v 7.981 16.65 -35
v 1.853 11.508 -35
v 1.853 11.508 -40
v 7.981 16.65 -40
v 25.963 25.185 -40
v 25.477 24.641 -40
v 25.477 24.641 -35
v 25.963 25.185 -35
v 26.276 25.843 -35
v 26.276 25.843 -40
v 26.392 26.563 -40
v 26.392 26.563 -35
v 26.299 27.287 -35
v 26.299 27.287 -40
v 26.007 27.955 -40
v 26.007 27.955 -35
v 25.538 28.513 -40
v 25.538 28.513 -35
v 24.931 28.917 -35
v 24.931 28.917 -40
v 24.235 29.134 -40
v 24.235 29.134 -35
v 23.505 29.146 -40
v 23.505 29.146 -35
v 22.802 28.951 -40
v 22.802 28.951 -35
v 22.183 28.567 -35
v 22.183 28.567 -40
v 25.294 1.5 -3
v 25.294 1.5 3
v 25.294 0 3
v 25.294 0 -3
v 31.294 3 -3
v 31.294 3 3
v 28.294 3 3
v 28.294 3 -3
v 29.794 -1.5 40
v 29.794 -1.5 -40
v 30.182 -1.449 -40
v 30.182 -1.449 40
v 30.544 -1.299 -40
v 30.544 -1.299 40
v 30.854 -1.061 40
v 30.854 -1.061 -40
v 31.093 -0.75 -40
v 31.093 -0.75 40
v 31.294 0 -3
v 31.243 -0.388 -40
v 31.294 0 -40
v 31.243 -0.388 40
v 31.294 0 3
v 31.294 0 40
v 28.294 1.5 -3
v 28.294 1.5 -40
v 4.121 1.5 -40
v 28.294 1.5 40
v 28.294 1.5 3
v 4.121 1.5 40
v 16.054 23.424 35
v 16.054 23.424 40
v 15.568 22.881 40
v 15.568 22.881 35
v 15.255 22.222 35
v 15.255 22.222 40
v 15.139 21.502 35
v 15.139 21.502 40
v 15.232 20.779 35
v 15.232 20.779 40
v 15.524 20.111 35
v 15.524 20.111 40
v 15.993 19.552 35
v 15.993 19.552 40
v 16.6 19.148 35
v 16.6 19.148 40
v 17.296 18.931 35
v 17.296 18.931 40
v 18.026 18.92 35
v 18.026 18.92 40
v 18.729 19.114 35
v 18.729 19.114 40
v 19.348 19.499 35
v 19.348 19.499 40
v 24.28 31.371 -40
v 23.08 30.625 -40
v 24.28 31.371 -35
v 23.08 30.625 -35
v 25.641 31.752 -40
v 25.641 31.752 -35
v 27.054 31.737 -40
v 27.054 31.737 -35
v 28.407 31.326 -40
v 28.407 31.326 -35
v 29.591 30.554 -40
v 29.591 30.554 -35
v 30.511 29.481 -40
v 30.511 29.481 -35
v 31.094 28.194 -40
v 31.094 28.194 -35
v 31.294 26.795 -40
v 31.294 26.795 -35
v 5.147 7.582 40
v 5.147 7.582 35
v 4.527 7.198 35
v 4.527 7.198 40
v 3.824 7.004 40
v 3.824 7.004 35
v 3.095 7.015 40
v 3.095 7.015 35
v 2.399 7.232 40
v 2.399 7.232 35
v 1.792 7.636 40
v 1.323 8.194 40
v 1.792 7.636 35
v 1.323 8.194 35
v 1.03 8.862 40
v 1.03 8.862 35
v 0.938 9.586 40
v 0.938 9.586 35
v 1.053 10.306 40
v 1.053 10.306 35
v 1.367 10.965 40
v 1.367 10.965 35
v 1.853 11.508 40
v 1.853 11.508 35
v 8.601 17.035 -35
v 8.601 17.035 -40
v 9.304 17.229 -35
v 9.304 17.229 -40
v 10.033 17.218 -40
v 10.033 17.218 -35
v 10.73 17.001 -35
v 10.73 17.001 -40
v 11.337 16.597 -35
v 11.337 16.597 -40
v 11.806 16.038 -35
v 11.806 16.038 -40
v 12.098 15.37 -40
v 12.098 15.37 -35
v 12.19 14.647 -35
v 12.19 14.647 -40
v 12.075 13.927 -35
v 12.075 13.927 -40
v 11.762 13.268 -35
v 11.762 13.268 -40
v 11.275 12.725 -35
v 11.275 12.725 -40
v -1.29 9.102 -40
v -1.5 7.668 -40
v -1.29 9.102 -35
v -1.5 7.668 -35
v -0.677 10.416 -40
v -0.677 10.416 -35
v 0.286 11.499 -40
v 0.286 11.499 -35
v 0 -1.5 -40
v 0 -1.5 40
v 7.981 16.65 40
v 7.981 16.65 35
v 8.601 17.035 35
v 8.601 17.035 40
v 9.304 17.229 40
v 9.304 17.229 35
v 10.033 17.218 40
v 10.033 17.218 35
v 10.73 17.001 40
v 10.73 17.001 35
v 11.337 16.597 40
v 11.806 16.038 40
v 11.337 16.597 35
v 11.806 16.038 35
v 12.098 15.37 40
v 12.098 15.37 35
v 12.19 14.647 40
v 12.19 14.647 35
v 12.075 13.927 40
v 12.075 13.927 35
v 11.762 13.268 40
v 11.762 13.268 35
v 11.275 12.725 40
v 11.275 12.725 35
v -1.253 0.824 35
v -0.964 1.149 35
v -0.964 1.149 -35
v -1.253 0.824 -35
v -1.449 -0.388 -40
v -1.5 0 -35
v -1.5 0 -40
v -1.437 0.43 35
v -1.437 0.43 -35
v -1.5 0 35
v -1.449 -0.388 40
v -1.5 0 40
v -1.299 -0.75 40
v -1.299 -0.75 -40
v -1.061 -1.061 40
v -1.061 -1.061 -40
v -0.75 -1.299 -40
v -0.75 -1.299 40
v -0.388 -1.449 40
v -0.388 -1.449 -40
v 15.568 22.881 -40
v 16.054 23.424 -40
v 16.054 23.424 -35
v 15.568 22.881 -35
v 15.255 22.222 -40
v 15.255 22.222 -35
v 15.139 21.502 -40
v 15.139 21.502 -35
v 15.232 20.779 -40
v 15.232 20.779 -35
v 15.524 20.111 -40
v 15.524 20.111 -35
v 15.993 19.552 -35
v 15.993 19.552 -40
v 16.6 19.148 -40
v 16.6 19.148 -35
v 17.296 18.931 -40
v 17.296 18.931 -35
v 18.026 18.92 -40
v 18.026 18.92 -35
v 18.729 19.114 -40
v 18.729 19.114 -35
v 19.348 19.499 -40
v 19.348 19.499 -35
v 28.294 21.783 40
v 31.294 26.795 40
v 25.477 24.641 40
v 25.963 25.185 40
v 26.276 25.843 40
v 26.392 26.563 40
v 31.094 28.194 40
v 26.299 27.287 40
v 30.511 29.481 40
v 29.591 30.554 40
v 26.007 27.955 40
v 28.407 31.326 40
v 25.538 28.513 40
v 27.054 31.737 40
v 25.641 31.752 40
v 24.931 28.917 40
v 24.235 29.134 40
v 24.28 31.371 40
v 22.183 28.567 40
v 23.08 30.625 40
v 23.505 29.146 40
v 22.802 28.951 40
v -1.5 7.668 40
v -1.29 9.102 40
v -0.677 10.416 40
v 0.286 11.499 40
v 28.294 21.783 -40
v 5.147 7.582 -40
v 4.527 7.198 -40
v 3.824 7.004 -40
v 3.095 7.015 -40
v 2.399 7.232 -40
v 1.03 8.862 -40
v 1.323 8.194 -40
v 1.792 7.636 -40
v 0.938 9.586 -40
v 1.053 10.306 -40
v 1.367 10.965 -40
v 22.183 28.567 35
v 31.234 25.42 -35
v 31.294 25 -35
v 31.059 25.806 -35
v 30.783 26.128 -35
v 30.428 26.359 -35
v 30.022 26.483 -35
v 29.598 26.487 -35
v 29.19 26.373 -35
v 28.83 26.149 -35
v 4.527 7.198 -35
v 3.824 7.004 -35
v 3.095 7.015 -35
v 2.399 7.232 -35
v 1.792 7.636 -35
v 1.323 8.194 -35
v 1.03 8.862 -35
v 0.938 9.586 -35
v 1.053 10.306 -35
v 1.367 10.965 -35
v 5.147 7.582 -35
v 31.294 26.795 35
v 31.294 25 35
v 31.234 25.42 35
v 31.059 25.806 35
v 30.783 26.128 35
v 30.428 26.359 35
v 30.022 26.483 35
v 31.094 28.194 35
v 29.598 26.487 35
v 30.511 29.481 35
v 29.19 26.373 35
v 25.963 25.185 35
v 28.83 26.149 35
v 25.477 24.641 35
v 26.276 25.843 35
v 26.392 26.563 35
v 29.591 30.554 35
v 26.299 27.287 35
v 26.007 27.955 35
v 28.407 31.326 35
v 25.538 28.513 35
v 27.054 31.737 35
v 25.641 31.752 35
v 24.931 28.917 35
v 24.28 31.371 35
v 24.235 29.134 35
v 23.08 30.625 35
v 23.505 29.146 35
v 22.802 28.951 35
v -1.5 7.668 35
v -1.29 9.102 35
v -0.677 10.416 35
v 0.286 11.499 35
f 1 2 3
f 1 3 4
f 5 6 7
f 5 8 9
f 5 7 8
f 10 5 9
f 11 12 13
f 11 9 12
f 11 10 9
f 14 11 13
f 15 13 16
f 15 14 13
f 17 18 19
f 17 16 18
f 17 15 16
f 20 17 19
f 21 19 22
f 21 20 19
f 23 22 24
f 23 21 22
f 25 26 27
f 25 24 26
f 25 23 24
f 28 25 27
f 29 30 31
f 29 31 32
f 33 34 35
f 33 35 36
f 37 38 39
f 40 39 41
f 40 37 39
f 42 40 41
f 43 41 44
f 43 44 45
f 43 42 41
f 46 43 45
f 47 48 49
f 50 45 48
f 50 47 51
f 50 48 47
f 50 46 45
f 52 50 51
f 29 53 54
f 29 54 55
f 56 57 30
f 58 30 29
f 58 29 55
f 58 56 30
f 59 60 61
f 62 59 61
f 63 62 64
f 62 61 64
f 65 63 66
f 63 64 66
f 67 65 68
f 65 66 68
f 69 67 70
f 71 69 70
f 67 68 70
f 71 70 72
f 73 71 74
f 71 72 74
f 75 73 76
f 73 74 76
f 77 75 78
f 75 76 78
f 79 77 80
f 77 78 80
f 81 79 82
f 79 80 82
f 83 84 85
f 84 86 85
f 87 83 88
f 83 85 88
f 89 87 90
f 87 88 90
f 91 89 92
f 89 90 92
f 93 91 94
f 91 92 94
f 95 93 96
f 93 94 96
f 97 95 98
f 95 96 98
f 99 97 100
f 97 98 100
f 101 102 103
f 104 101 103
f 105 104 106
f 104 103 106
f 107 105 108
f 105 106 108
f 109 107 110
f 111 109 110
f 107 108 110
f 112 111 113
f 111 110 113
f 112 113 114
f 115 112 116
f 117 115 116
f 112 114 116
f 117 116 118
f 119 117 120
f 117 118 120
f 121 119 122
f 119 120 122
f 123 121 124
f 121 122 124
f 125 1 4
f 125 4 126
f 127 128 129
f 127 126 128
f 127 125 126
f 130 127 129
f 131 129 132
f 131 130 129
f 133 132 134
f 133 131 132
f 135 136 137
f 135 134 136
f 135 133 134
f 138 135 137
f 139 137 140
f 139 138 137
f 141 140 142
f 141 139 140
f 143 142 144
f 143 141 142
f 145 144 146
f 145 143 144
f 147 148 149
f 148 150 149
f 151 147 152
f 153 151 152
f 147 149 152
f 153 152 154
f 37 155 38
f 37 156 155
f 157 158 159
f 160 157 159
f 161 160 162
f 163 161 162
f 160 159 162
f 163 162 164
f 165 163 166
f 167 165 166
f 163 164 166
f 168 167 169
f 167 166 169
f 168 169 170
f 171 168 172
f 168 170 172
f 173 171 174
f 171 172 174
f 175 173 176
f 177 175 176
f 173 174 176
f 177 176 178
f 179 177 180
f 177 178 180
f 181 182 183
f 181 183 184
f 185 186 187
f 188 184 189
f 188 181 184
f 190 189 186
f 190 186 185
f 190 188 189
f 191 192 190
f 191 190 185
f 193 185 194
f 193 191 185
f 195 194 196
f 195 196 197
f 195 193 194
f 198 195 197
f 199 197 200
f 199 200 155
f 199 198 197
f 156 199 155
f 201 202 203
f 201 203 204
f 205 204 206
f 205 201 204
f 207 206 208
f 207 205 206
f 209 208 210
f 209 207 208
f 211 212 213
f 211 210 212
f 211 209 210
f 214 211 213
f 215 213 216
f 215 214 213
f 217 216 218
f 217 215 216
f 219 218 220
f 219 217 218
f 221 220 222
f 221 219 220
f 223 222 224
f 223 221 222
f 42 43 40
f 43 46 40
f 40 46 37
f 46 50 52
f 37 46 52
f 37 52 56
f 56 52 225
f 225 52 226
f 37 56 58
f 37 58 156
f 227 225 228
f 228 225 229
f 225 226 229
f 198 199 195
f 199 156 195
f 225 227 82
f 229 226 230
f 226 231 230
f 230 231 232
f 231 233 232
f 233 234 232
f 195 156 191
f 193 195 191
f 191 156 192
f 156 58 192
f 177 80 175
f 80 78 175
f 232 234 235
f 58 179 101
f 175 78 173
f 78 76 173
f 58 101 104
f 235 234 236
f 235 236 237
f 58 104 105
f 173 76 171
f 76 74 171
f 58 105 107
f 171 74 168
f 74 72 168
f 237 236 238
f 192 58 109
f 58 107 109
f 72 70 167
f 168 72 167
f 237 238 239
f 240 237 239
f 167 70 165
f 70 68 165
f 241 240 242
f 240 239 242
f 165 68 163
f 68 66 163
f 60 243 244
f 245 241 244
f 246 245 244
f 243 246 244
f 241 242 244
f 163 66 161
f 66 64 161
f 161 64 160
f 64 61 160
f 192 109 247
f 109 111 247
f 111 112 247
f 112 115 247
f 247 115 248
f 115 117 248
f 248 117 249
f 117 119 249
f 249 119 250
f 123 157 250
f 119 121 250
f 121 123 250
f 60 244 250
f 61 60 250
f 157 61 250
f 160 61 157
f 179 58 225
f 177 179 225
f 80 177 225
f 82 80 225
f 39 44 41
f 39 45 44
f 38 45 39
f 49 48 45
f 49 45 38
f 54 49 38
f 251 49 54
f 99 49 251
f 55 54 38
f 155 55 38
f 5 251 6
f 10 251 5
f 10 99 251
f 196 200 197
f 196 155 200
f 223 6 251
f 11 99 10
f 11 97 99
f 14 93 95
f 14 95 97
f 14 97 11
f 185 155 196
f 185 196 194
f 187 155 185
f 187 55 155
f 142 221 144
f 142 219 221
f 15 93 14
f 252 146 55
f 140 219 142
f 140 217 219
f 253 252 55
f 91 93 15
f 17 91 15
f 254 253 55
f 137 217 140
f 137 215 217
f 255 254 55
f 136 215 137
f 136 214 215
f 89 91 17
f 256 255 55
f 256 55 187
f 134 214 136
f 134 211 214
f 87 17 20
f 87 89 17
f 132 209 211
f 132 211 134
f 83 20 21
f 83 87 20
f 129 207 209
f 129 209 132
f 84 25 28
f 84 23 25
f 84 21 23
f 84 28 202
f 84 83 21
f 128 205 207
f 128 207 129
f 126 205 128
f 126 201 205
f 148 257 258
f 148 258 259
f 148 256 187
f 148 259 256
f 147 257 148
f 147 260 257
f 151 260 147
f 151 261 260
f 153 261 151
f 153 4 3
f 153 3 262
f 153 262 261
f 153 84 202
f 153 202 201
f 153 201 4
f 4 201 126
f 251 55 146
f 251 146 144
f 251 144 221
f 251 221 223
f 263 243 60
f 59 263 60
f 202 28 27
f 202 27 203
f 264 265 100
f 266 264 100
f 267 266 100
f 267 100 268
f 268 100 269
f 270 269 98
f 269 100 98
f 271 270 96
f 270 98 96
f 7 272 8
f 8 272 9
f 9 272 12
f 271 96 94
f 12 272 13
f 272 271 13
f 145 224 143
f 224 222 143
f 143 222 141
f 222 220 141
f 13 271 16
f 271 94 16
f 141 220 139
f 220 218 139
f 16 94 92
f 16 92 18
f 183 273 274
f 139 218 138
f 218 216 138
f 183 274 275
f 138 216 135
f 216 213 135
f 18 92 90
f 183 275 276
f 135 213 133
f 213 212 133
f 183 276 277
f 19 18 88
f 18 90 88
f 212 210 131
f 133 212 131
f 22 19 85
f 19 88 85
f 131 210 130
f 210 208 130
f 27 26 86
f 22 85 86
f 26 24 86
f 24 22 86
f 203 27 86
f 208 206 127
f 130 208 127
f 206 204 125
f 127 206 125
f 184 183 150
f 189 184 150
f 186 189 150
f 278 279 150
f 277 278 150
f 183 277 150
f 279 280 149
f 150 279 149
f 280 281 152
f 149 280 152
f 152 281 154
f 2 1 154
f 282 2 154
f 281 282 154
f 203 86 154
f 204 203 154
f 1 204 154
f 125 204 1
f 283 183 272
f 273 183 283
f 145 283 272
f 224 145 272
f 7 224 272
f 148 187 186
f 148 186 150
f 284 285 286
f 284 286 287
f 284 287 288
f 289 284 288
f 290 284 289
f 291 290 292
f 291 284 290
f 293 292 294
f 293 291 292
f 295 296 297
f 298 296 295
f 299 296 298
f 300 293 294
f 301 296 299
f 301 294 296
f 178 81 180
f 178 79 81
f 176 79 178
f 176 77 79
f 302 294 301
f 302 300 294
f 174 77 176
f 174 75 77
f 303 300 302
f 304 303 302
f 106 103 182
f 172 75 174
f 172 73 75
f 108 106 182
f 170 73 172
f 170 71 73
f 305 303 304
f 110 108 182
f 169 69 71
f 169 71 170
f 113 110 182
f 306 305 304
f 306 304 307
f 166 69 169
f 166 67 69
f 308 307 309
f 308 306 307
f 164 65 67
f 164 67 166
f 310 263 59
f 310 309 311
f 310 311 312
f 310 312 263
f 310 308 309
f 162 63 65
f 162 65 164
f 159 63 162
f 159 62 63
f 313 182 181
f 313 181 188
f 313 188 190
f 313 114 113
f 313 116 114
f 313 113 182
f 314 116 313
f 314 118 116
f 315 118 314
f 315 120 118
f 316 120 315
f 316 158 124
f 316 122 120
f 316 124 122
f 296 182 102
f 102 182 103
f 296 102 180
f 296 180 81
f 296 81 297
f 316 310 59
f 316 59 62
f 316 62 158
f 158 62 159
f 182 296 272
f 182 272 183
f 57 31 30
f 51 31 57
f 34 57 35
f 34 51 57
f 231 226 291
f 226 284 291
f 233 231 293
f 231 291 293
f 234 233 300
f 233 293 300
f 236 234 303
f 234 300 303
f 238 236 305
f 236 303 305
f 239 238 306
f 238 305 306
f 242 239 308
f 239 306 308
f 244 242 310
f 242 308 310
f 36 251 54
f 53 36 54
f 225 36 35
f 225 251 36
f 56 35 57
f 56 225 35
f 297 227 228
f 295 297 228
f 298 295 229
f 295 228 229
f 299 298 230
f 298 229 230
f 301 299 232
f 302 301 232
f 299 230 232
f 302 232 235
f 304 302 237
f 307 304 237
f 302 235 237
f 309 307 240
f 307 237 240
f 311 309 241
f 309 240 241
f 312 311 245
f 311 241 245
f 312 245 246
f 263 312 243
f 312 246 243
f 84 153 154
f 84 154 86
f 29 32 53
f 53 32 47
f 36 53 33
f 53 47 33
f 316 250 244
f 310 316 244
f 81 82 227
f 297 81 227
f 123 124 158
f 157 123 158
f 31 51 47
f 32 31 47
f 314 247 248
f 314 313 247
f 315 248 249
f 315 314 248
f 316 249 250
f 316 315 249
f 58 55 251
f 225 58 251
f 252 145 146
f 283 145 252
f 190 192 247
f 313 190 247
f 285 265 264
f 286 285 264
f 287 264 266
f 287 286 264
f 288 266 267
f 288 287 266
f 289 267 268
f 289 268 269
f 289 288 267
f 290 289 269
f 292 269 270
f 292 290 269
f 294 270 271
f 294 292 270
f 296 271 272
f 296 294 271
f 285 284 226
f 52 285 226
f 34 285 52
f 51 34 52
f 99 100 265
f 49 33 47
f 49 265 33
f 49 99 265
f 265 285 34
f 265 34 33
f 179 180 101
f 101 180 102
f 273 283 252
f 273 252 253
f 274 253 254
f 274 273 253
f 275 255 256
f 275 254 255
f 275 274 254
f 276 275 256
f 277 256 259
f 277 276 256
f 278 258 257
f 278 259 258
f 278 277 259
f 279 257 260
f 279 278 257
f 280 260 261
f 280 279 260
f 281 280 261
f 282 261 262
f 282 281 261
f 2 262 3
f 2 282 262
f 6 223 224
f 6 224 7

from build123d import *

# Parameters (mm, degrees)
BOSS_EXTRUDE1_DEPTH  = 40
BOSS_EXTRUDE2_DEPTH  = 5
FILLET1_R            = 5
CUT_EXTRUDE2_DEPTH   = 92.598097397
FILLET1_OF_MIRROR1_R = 5
SKETCH8_W            = 6
SKETCH8_H            = 3
CUT_EXTRUDE3_DEPTH   = 6


with BuildPart() as part:
    # Sketch1 → Boss-Extrude1 (new, symmetric)
    with BuildSketch(Plane.XY):
        with BuildLine():
            ThreePointArc((0.964181415, -1.149066665), (0.513030215, -1.409538931), (0, -1.5))
            Line((0, -1.5), (29.793839815, -1.5))
            ThreePointArc((29.793839815, -1.5), (28.733179643, -1.060660172), (28.293839815, 0))
            Line((28.293839815, 0), (28.293839815, 1.5))
            Line((28.293839815, 1.5), (4.121216129, 1.5))
            Line((4.121216129, 1.5), (0.964181415, -1.149066665))
        make_face()
        with BuildLine():
            Line((28.8296584, 26.149066665), (-0.964181415, 1.149066665))
            ThreePointArc((-0.964181415, 1.149066665), (-0.513030215, 1.409538931), (0, 1.5))
            Line((0, 1.5), (4.121216129, 1.5))
            Line((4.121216129, 1.5), (28.293839815, 21.783239619))
            Line((28.293839815, 21.783239619), (28.293839815, 25))
            ThreePointArc((28.293839815, 25), (28.434378134, 25.633927393), (28.8296584, 26.149066665))
        make_face()
        with BuildLine():
            Line((31.293839815, 0), (31.293839815, 25))
            ThreePointArc((31.293839815, 25), (31.153301495, 24.366072607), (30.758021229, 23.850933335))
            Line((30.758021229, 23.850933335), (28.293839815, 21.783239619))
            Line((28.293839815, 21.783239619), (28.293839815, 1.5))
            Line((28.293839815, 1.5), (29.793839815, 1.5))
            ThreePointArc((29.793839815, 1.5), (30.854499987, 1.060660172), (31.293839815, 0))
        make_face()
        with BuildLine():
            ThreePointArc((28.293839815, 0), (28.733179643, -1.060660172), (29.793839815, -1.5))
            ThreePointArc((29.793839815, -1.5), (30.854499987, -1.060660172), (31.293839815, 0))
            ThreePointArc((31.293839815, 0), (30.854499987, 1.060660172), (29.793839815, 1.5))
            Line((29.793839815, 1.5), (28.293839815, 1.5))
            Line((28.293839815, 1.5), (28.293839815, 0))
        make_face()
        with BuildLine():
            ThreePointArc((0, 1.5), (-0.513030215, 1.409538931), (-0.964181415, 1.149066665))
            ThreePointArc((-0.964181415, 1.149066665), (-1.409538931, -0.513030215), (0, -1.5))
            ThreePointArc((0, -1.5), (0.513030215, -1.409538931), (0.964181415, -1.149066665))
            Line((0.964181415, -1.149066665), (4.121216129, 1.5))
            Line((4.121216129, 1.5), (0, 1.5))
        make_face()
        with BuildLine():
            ThreePointArc((31.293839815, 25), (30.427767207, 26.359461681), (28.8296584, 26.149066665))
            ThreePointArc((28.8296584, 26.149066665), (28.434378134, 25.633927393), (28.293839815, 25))
            Line((28.293839815, 25), (28.293839815, 21.783239619))
            Line((28.293839815, 21.783239619), (30.758021229, 23.850933335))
            ThreePointArc((30.758021229, 23.850933335), (31.153301495, 24.366072607), (31.293839815, 25))
        make_face()
    extrude(amount=BOSS_EXTRUDE1_DEPTH, both=True)

    # Sketch5 → Boss-Extrude2 (add)
    with BuildSketch(Plane.XY.offset(40)):
        Polygon((-1.5, 0), (-1.5, 10), (31.293839815, 37.517298894), (31.293839815, 25), align=None)
    boss_extrude2 = extrude(amount=-BOSS_EXTRUDE2_DEPTH)

    # Fillet1
    fillet1_edges = [part.edges().sort_by_distance(p)[0] for p in [
        (-1.5, 10, 37.5),
        (31.293839815, 37.517298894, 37.5),
    ]]
    fillet(fillet1_edges, radius=FILLET1_R)

    # Sketch7 → Cut-Extrude2 (cut, symmetric)
    with BuildSketch(Plane.XY.offset(40)):
        with BuildLine():
            Line((1.852977001, 11.508074476), (7.981332546, 16.650375353))
            ThreePointArc((7.981332546, 16.650375353), (11.591201121, 16.334552776), (11.275378544, 12.724684201))
            Line((11.275378544, 12.724684201), (5.147022999, 7.582383323))
            ThreePointArc((5.147022999, 7.582383323), (1.537154424, 7.898205901), (1.852977001, 11.508074476))
        make_face()
        with BuildLine():
            Line((22.182635401, 28.566683341), (16.054279856, 23.424382464))
            ThreePointArc((16.054279856, 23.424382464), (15.738457279, 19.814513889), (19.348325854, 19.498691312))
            Line((19.348325854, 19.498691312), (25.476681399, 24.640992189))
            ThreePointArc((25.476681399, 24.640992189), (25.792503976, 28.250860764), (22.182635401, 28.566683341))
        make_face()
    cut_extrude2 = extrude(amount=CUT_EXTRUDE2_DEPTH, both=True, mode=Mode.SUBTRACT)

    # Mirror1: Boss-Extrude2, Cut-Extrude2 across plane
    add(boss_extrude2.mirror(Plane.XY))
    add(cut_extrude2.mirror(Plane.XY), mode=Mode.SUBTRACT)

    # Fillet1 of Mirror1
    fillet1_of_mirror1_edges = [part.edges().sort_by_distance(p)[0] for p in [
        (-1.5, 10, -37.5),
        (31.293839815, 37.517298894, -37.5),
    ]]
    fillet(fillet1_of_mirror1_edges, radius=FILLET1_OF_MIRROR1_R)

    # Sketch8 → Cut-Extrude3 (cut)
    with BuildSketch(Plane(origin=(31.293839815, 0, 0), x_dir=(0, 0, -1), z_dir=(1, 0, 0))):
        with Locations((0, 1.5)):
            Rectangle(SKETCH8_W, SKETCH8_H)
    extrude(amount=-CUT_EXTRUDE3_DEPTH, mode=Mode.SUBTRACT)


solid = part.part
